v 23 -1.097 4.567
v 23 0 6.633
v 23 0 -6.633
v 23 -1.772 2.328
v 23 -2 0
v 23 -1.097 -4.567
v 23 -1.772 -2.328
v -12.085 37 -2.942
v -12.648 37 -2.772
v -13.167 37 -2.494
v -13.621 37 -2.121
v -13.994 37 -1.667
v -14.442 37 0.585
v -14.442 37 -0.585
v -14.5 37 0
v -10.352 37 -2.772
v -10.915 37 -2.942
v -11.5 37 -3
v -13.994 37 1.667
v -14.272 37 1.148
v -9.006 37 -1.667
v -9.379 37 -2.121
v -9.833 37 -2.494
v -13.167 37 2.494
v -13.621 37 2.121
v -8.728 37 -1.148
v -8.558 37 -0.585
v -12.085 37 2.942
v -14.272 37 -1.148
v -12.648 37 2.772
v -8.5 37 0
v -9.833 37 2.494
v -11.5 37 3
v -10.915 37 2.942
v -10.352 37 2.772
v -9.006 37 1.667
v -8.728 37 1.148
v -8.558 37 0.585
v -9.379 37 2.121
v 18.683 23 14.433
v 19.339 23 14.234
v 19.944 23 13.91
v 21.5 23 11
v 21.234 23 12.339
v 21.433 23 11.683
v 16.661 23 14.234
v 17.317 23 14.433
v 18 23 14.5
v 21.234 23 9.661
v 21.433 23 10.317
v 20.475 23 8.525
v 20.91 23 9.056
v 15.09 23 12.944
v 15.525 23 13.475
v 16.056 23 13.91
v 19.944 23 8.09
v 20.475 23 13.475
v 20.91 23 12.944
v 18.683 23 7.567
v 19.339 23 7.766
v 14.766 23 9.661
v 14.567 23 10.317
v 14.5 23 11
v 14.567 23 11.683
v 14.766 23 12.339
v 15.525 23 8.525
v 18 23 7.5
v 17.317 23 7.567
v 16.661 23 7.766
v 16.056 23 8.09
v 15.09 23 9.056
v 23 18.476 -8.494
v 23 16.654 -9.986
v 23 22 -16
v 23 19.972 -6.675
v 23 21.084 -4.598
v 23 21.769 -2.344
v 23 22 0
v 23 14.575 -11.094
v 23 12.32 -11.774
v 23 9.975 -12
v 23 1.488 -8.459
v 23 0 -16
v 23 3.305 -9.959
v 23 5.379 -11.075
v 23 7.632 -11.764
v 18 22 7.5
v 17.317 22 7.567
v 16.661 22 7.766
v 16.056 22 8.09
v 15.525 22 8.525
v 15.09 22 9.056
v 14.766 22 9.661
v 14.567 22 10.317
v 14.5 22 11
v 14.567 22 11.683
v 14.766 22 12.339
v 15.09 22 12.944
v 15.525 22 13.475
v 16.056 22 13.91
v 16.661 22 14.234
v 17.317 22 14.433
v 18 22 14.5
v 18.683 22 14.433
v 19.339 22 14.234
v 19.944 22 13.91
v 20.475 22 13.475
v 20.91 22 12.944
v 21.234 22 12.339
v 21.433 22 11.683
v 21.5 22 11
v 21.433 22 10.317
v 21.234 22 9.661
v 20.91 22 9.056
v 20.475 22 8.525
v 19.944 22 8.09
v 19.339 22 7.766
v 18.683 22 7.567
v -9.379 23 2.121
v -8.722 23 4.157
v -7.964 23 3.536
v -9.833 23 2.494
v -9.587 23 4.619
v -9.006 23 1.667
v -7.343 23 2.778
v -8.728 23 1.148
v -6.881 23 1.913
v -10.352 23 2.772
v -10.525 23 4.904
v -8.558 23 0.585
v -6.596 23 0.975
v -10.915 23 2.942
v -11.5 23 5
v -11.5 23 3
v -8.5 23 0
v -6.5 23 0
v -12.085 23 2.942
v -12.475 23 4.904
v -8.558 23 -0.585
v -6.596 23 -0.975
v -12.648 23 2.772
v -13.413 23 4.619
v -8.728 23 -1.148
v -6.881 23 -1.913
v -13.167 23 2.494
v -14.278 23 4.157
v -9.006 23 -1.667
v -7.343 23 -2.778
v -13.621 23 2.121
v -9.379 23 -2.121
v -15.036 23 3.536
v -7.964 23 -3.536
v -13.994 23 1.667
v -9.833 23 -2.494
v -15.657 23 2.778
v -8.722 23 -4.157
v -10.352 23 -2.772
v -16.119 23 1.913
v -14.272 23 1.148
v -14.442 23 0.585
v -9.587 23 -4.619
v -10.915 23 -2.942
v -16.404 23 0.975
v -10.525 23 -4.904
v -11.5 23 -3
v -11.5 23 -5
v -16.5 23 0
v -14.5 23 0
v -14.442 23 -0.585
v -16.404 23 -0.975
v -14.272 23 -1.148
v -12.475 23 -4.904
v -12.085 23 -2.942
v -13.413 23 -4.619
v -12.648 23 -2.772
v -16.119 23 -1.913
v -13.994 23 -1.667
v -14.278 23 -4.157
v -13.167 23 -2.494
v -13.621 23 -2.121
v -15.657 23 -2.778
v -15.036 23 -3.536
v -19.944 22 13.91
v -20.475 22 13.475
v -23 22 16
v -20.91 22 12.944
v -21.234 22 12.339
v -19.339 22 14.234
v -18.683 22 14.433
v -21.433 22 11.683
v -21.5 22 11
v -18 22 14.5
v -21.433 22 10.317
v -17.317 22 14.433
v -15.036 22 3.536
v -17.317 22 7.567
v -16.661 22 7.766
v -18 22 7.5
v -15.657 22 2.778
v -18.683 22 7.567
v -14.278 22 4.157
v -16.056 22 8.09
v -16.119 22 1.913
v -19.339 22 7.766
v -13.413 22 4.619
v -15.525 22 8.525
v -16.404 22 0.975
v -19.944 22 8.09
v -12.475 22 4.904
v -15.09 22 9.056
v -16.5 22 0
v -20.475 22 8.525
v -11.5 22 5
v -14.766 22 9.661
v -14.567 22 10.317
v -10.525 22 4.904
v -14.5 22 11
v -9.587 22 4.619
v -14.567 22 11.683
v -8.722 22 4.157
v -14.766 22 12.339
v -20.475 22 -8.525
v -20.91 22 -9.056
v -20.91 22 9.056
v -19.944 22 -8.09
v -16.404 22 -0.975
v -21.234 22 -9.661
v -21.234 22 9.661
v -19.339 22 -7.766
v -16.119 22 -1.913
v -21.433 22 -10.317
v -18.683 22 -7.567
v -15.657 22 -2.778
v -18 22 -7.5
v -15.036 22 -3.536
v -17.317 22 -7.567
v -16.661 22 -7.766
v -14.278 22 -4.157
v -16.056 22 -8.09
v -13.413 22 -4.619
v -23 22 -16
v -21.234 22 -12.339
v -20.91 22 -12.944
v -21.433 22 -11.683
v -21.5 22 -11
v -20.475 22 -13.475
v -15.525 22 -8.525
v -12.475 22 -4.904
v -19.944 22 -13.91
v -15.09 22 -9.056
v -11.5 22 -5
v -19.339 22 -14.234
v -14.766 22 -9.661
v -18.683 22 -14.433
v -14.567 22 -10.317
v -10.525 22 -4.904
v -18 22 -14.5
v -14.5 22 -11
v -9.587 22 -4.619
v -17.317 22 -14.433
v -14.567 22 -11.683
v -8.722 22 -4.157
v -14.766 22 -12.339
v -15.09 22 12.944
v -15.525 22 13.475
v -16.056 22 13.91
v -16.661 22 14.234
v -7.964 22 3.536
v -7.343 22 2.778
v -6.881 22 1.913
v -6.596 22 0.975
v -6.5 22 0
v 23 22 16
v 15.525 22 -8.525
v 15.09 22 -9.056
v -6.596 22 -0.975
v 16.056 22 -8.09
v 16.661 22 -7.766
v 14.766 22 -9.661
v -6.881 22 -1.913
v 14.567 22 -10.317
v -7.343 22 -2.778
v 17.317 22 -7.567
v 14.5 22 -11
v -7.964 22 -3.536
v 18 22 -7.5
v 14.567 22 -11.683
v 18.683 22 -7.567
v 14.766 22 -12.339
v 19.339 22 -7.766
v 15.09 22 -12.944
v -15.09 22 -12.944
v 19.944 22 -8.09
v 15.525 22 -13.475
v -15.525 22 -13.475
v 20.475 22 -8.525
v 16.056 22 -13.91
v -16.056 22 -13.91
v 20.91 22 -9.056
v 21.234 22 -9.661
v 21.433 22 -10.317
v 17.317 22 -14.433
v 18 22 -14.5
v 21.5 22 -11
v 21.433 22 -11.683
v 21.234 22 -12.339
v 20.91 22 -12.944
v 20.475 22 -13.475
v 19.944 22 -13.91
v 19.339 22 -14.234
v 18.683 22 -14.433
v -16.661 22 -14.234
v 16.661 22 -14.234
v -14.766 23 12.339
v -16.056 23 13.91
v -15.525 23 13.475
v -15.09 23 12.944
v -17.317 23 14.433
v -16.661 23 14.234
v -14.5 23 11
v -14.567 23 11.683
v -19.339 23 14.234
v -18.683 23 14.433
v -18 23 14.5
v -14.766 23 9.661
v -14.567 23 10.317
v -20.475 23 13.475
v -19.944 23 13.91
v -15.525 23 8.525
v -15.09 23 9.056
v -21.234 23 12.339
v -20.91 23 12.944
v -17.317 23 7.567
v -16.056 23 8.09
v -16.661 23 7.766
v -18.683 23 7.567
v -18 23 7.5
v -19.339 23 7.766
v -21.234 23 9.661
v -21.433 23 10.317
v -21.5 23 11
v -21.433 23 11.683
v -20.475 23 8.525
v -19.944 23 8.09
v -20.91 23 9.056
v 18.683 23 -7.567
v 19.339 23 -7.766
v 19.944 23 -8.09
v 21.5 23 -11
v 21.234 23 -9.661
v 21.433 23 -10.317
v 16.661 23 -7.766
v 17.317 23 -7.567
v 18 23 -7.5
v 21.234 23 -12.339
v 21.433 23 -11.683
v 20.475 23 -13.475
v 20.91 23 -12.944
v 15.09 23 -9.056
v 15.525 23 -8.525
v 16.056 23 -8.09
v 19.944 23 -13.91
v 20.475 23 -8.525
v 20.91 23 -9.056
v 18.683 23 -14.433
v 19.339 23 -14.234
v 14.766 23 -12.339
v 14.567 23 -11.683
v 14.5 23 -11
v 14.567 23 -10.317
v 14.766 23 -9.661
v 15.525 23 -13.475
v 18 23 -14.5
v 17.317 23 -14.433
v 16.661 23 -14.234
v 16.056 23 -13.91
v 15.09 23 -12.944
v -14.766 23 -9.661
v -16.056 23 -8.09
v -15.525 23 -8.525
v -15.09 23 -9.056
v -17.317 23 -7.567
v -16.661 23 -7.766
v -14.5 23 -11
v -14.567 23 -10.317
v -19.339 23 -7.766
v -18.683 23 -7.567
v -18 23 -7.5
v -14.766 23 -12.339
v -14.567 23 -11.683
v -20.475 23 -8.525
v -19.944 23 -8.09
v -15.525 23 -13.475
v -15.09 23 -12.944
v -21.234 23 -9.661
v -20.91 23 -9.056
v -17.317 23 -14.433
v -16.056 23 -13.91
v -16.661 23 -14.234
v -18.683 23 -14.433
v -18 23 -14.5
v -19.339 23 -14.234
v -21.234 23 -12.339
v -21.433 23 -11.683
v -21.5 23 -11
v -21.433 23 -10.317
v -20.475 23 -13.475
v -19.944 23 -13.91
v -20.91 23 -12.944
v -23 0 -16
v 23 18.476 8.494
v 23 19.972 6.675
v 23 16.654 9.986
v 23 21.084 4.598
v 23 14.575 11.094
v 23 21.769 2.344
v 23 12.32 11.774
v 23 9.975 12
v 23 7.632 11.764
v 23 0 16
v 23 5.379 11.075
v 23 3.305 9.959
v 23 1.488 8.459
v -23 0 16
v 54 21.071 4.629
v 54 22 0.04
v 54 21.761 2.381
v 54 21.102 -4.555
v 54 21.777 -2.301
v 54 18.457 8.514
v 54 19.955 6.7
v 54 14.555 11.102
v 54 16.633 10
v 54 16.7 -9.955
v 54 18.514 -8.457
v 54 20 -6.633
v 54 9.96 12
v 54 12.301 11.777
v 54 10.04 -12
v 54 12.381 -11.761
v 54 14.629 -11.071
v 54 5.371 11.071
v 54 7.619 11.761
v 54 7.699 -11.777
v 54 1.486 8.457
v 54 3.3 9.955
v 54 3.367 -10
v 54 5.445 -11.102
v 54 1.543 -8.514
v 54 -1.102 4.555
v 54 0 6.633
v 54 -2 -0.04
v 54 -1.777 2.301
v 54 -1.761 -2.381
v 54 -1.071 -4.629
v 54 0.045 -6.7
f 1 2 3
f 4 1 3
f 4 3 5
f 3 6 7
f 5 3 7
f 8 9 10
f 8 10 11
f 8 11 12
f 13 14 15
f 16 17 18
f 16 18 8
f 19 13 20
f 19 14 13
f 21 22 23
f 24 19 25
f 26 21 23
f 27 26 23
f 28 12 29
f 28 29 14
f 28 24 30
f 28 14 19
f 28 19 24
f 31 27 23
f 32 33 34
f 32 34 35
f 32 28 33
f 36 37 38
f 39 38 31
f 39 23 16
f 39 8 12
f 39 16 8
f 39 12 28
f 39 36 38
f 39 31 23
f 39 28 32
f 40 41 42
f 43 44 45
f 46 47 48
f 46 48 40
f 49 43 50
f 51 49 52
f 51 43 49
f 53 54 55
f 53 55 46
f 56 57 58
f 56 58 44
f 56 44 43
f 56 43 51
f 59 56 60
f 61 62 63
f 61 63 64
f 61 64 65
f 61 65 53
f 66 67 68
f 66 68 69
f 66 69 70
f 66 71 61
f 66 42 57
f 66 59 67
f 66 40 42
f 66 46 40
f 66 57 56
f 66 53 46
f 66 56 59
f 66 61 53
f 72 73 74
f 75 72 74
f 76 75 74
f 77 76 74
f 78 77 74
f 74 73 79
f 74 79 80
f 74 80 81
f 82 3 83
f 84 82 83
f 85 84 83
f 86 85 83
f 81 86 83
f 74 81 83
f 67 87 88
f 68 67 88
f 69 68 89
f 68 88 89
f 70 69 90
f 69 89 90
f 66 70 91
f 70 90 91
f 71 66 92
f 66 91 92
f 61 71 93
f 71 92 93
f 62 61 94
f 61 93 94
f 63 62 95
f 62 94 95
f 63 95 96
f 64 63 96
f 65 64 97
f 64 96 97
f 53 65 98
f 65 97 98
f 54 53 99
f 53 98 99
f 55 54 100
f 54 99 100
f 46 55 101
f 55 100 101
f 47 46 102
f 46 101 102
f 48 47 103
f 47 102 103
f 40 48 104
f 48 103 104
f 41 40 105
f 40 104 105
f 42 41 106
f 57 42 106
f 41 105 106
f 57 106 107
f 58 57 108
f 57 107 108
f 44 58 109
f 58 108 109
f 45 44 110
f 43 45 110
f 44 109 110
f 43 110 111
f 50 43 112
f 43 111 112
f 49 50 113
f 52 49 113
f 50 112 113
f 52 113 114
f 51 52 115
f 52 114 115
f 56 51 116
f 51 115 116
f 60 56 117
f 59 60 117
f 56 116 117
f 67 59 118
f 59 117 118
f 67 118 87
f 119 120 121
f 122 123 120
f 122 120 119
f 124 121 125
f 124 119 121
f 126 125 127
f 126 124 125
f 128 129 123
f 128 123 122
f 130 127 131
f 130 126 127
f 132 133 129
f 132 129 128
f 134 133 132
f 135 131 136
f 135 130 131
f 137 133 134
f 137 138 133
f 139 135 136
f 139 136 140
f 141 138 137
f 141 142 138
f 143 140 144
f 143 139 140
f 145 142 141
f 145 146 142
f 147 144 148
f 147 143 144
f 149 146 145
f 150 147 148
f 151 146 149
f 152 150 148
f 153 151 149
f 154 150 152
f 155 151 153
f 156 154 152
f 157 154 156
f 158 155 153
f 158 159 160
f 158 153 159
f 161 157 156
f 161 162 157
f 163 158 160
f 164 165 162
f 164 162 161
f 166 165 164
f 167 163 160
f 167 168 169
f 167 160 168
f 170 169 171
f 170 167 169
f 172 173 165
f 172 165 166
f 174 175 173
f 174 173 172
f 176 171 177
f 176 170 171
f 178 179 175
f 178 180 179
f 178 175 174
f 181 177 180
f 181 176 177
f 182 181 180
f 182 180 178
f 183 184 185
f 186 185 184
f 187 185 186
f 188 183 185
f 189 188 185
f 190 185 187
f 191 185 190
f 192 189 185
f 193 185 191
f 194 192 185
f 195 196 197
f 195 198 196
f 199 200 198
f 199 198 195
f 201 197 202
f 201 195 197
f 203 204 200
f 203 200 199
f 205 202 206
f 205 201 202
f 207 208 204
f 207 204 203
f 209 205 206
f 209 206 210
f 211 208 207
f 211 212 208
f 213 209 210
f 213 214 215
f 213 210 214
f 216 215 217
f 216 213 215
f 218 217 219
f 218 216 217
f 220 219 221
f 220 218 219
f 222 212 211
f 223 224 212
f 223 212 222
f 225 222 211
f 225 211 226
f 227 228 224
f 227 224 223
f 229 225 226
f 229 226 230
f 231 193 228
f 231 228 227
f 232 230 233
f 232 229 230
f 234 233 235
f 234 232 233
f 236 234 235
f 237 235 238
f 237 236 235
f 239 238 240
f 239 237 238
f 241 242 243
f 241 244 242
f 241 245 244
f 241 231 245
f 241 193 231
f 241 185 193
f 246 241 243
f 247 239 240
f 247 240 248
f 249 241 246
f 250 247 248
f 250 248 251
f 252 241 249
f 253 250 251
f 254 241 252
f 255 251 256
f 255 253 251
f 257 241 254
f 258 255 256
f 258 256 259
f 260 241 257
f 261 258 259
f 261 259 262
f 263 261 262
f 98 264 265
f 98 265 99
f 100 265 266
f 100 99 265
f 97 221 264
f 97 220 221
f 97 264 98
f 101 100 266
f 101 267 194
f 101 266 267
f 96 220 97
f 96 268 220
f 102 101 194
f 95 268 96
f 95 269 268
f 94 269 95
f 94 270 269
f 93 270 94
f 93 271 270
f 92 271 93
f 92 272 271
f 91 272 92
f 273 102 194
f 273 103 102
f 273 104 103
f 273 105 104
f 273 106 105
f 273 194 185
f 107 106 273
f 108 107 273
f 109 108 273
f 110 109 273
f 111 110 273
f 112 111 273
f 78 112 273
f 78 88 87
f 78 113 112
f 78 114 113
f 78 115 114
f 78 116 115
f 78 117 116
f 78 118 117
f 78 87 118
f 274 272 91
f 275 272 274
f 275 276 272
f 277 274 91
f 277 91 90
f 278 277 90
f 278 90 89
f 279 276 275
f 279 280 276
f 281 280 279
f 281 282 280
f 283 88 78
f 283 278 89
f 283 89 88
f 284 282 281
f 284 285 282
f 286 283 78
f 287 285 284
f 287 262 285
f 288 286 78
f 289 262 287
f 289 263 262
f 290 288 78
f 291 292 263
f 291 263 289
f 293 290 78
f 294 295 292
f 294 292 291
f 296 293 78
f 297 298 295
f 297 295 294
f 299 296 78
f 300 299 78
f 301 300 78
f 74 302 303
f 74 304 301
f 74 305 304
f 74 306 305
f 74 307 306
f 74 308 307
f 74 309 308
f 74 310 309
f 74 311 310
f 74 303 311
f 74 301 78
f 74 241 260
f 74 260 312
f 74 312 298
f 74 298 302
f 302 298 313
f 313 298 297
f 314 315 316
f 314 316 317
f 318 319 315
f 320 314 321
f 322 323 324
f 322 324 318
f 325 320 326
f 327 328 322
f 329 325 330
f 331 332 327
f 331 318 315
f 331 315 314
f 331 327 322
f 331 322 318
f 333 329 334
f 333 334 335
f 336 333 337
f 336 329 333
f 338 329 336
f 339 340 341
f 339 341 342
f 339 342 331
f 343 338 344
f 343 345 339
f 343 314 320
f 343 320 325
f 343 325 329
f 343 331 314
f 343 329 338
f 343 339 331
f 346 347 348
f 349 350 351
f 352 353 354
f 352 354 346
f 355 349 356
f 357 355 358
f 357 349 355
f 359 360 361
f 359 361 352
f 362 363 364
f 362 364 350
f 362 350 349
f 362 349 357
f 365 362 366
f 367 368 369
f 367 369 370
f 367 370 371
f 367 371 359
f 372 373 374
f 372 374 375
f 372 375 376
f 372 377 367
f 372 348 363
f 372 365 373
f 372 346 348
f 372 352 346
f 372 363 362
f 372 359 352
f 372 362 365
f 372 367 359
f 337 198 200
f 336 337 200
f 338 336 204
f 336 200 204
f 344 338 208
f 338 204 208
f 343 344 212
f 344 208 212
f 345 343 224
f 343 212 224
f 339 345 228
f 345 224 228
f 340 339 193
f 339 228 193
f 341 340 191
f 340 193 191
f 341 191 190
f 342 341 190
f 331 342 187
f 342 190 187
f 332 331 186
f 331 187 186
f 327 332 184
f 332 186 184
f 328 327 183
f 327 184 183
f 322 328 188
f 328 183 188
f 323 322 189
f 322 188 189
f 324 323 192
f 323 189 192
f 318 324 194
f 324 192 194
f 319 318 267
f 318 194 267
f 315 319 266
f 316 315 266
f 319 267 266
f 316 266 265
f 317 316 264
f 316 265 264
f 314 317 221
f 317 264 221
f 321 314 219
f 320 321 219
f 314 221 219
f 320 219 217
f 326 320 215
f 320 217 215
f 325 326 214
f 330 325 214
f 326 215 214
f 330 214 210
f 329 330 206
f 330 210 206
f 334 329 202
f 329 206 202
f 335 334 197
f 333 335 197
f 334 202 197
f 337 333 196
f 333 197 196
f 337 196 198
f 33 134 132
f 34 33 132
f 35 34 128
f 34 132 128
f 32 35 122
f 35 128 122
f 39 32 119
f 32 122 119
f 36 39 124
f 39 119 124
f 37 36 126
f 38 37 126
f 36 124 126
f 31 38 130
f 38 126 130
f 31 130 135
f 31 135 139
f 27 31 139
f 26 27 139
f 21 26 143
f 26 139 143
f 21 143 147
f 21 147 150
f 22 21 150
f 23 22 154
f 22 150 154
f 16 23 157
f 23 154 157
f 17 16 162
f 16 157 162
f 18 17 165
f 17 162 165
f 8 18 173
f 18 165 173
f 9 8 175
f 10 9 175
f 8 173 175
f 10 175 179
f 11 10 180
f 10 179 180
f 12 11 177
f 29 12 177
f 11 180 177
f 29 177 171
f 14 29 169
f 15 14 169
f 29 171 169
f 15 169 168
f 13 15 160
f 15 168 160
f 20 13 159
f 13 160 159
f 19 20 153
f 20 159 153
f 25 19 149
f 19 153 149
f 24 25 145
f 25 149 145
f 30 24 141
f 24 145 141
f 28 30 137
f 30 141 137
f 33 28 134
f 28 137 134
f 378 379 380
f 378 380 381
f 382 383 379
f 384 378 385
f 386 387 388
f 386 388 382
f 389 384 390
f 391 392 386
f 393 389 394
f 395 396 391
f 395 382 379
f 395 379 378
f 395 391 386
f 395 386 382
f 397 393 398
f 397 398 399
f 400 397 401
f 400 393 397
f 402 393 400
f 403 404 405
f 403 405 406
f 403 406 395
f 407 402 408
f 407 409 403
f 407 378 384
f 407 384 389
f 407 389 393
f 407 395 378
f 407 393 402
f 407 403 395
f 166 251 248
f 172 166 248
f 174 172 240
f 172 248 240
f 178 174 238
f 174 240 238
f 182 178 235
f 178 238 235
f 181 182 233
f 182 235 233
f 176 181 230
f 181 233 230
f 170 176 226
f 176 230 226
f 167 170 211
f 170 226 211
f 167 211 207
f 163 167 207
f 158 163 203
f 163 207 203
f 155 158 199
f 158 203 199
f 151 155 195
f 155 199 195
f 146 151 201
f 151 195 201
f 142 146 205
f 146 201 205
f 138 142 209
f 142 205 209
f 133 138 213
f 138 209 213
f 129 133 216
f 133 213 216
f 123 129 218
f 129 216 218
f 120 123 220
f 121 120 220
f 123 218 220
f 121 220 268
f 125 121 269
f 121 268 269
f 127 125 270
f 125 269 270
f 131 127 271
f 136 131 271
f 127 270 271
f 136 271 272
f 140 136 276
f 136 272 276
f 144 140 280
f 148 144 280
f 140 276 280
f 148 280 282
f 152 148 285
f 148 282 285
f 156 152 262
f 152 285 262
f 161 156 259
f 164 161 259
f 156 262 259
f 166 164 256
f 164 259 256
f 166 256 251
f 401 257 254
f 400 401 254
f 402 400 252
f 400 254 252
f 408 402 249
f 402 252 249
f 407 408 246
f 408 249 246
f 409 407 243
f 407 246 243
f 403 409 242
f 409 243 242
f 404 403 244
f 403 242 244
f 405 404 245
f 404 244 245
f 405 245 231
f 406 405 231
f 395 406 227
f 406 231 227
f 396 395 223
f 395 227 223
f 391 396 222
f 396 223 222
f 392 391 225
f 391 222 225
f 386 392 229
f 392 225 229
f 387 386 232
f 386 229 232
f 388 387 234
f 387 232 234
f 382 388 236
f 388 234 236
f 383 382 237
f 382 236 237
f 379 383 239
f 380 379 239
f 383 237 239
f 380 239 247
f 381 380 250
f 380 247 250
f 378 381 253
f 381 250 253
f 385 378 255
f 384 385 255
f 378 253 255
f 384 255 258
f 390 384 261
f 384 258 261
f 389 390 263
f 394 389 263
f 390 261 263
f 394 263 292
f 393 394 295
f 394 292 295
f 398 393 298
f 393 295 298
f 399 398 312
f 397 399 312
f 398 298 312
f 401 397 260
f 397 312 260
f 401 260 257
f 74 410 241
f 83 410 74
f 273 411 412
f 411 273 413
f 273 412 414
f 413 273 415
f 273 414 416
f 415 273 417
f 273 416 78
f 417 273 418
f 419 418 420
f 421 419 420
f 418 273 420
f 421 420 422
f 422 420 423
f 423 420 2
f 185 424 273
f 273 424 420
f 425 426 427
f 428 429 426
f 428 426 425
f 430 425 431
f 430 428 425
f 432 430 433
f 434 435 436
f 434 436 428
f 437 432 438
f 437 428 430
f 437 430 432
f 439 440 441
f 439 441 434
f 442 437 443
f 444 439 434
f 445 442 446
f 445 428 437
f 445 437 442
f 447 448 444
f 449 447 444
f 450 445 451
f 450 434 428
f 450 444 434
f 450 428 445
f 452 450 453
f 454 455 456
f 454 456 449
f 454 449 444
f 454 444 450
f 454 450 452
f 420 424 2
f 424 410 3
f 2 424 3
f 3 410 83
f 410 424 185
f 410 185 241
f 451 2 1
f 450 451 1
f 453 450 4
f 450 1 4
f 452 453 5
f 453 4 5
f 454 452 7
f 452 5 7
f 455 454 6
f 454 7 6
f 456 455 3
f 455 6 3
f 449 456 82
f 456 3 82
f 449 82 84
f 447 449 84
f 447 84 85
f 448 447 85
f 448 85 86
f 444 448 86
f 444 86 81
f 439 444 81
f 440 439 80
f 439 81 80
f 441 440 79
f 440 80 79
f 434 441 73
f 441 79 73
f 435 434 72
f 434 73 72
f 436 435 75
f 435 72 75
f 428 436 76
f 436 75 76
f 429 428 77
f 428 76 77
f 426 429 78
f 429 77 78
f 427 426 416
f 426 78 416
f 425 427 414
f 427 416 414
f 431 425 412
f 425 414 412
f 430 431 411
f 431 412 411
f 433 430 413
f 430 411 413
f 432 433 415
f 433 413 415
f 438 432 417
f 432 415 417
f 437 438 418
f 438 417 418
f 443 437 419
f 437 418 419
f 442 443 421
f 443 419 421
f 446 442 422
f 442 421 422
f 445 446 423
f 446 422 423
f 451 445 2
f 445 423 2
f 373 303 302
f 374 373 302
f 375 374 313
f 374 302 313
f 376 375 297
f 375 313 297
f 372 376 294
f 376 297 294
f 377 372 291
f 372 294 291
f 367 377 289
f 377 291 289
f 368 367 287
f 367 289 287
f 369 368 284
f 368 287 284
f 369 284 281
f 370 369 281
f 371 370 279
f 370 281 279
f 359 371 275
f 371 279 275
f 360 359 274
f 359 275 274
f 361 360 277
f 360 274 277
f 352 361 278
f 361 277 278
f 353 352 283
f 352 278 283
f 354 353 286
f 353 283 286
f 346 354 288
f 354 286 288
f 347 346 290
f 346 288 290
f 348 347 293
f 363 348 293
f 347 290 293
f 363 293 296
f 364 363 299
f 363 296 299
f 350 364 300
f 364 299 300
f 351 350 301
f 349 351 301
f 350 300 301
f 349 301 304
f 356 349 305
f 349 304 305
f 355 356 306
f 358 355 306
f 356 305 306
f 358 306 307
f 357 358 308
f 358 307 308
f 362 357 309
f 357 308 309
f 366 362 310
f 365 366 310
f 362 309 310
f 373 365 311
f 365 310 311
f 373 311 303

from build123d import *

# Parameters (mm, degrees)
SKETCH_1_W      = 46
SKETCH_1_H      = 32
EXTRUDE_1_DEPTH = 22
SKETCH_2_R      = 12
EXTRUDE_2_DEPTH = 31
SKETCH_3_R      = 5
EXTRUDE_3_DEPTH = 1
SKETCH_4_R      = 3
EXTRUDE_4_DEPTH = 14
SKETCH_5_R      = 3.5
EXTRUDE_5_DEPTH = 1


with BuildPart() as part:
    # Эскиз1 → Бобышка-Вытянуть1 (new body)
    with BuildSketch(Plane(origin=(0, 0, 0), x_dir=(1, 0, 0), z_dir=(0, 1, 0))):
        Rectangle(SKETCH_1_W, SKETCH_1_H)
    extrude(amount=EXTRUDE_1_DEPTH)

    # Эскиз2 → Бобышка-Вытянуть2 (add)
    with BuildSketch(Plane(origin=(23, 0, 0), x_dir=(0, 0, -1), z_dir=(1, 0, 0))):
        with Locations(Location((0, 10, 0), (0, 0, 236.442690238))):
            Circle(SKETCH_2_R)
    extrude(amount=EXTRUDE_2_DEPTH)

    # Эскиз3 → Бобышка-Вытянуть3 (add)
    with BuildSketch(Plane(origin=(0, 22, 0), x_dir=(1, 0, 0), z_dir=(0, 1, 0))):
        with Locations(Location((-11.5, 0, 0), (0, 0, 90))):
            Circle(SKETCH_3_R)
    extrude(amount=EXTRUDE_3_DEPTH)

    # Эскиз4 → Бобышка-Вытянуть4 (add)
    with BuildSketch(Plane(origin=(0, 23, 0), x_dir=(1, 0, 0), z_dir=(0, 1, 0))):
        with Locations(Location((-11.5, 0, 0), (0, 0, 270))):
            Circle(SKETCH_4_R)
    extrude(amount=EXTRUDE_4_DEPTH)

    # Эскиз5 → Бобышка-Вытянуть5 (add)
    with BuildSketch(Plane(origin=(0, 22, 0), x_dir=(1, 0, 0), z_dir=(0, 1, 0))):
        with Locations(Location((18, 11, 0), (0, 0, 90))):
            Circle(SKETCH_5_R)
        with Locations(Location((18, -11, 0), (0, 0, 90))):
            Circle(SKETCH_5_R)
        with Locations(Location((-18, -11, 0), (0, 0, 90))):
            Circle(SKETCH_5_R)
        with Locations(Location((-18, 11, 0), (0, 0, 90))):
            Circle(SKETCH_5_R)
    extrude(amount=EXTRUDE_5_DEPTH)


solid = part.part
